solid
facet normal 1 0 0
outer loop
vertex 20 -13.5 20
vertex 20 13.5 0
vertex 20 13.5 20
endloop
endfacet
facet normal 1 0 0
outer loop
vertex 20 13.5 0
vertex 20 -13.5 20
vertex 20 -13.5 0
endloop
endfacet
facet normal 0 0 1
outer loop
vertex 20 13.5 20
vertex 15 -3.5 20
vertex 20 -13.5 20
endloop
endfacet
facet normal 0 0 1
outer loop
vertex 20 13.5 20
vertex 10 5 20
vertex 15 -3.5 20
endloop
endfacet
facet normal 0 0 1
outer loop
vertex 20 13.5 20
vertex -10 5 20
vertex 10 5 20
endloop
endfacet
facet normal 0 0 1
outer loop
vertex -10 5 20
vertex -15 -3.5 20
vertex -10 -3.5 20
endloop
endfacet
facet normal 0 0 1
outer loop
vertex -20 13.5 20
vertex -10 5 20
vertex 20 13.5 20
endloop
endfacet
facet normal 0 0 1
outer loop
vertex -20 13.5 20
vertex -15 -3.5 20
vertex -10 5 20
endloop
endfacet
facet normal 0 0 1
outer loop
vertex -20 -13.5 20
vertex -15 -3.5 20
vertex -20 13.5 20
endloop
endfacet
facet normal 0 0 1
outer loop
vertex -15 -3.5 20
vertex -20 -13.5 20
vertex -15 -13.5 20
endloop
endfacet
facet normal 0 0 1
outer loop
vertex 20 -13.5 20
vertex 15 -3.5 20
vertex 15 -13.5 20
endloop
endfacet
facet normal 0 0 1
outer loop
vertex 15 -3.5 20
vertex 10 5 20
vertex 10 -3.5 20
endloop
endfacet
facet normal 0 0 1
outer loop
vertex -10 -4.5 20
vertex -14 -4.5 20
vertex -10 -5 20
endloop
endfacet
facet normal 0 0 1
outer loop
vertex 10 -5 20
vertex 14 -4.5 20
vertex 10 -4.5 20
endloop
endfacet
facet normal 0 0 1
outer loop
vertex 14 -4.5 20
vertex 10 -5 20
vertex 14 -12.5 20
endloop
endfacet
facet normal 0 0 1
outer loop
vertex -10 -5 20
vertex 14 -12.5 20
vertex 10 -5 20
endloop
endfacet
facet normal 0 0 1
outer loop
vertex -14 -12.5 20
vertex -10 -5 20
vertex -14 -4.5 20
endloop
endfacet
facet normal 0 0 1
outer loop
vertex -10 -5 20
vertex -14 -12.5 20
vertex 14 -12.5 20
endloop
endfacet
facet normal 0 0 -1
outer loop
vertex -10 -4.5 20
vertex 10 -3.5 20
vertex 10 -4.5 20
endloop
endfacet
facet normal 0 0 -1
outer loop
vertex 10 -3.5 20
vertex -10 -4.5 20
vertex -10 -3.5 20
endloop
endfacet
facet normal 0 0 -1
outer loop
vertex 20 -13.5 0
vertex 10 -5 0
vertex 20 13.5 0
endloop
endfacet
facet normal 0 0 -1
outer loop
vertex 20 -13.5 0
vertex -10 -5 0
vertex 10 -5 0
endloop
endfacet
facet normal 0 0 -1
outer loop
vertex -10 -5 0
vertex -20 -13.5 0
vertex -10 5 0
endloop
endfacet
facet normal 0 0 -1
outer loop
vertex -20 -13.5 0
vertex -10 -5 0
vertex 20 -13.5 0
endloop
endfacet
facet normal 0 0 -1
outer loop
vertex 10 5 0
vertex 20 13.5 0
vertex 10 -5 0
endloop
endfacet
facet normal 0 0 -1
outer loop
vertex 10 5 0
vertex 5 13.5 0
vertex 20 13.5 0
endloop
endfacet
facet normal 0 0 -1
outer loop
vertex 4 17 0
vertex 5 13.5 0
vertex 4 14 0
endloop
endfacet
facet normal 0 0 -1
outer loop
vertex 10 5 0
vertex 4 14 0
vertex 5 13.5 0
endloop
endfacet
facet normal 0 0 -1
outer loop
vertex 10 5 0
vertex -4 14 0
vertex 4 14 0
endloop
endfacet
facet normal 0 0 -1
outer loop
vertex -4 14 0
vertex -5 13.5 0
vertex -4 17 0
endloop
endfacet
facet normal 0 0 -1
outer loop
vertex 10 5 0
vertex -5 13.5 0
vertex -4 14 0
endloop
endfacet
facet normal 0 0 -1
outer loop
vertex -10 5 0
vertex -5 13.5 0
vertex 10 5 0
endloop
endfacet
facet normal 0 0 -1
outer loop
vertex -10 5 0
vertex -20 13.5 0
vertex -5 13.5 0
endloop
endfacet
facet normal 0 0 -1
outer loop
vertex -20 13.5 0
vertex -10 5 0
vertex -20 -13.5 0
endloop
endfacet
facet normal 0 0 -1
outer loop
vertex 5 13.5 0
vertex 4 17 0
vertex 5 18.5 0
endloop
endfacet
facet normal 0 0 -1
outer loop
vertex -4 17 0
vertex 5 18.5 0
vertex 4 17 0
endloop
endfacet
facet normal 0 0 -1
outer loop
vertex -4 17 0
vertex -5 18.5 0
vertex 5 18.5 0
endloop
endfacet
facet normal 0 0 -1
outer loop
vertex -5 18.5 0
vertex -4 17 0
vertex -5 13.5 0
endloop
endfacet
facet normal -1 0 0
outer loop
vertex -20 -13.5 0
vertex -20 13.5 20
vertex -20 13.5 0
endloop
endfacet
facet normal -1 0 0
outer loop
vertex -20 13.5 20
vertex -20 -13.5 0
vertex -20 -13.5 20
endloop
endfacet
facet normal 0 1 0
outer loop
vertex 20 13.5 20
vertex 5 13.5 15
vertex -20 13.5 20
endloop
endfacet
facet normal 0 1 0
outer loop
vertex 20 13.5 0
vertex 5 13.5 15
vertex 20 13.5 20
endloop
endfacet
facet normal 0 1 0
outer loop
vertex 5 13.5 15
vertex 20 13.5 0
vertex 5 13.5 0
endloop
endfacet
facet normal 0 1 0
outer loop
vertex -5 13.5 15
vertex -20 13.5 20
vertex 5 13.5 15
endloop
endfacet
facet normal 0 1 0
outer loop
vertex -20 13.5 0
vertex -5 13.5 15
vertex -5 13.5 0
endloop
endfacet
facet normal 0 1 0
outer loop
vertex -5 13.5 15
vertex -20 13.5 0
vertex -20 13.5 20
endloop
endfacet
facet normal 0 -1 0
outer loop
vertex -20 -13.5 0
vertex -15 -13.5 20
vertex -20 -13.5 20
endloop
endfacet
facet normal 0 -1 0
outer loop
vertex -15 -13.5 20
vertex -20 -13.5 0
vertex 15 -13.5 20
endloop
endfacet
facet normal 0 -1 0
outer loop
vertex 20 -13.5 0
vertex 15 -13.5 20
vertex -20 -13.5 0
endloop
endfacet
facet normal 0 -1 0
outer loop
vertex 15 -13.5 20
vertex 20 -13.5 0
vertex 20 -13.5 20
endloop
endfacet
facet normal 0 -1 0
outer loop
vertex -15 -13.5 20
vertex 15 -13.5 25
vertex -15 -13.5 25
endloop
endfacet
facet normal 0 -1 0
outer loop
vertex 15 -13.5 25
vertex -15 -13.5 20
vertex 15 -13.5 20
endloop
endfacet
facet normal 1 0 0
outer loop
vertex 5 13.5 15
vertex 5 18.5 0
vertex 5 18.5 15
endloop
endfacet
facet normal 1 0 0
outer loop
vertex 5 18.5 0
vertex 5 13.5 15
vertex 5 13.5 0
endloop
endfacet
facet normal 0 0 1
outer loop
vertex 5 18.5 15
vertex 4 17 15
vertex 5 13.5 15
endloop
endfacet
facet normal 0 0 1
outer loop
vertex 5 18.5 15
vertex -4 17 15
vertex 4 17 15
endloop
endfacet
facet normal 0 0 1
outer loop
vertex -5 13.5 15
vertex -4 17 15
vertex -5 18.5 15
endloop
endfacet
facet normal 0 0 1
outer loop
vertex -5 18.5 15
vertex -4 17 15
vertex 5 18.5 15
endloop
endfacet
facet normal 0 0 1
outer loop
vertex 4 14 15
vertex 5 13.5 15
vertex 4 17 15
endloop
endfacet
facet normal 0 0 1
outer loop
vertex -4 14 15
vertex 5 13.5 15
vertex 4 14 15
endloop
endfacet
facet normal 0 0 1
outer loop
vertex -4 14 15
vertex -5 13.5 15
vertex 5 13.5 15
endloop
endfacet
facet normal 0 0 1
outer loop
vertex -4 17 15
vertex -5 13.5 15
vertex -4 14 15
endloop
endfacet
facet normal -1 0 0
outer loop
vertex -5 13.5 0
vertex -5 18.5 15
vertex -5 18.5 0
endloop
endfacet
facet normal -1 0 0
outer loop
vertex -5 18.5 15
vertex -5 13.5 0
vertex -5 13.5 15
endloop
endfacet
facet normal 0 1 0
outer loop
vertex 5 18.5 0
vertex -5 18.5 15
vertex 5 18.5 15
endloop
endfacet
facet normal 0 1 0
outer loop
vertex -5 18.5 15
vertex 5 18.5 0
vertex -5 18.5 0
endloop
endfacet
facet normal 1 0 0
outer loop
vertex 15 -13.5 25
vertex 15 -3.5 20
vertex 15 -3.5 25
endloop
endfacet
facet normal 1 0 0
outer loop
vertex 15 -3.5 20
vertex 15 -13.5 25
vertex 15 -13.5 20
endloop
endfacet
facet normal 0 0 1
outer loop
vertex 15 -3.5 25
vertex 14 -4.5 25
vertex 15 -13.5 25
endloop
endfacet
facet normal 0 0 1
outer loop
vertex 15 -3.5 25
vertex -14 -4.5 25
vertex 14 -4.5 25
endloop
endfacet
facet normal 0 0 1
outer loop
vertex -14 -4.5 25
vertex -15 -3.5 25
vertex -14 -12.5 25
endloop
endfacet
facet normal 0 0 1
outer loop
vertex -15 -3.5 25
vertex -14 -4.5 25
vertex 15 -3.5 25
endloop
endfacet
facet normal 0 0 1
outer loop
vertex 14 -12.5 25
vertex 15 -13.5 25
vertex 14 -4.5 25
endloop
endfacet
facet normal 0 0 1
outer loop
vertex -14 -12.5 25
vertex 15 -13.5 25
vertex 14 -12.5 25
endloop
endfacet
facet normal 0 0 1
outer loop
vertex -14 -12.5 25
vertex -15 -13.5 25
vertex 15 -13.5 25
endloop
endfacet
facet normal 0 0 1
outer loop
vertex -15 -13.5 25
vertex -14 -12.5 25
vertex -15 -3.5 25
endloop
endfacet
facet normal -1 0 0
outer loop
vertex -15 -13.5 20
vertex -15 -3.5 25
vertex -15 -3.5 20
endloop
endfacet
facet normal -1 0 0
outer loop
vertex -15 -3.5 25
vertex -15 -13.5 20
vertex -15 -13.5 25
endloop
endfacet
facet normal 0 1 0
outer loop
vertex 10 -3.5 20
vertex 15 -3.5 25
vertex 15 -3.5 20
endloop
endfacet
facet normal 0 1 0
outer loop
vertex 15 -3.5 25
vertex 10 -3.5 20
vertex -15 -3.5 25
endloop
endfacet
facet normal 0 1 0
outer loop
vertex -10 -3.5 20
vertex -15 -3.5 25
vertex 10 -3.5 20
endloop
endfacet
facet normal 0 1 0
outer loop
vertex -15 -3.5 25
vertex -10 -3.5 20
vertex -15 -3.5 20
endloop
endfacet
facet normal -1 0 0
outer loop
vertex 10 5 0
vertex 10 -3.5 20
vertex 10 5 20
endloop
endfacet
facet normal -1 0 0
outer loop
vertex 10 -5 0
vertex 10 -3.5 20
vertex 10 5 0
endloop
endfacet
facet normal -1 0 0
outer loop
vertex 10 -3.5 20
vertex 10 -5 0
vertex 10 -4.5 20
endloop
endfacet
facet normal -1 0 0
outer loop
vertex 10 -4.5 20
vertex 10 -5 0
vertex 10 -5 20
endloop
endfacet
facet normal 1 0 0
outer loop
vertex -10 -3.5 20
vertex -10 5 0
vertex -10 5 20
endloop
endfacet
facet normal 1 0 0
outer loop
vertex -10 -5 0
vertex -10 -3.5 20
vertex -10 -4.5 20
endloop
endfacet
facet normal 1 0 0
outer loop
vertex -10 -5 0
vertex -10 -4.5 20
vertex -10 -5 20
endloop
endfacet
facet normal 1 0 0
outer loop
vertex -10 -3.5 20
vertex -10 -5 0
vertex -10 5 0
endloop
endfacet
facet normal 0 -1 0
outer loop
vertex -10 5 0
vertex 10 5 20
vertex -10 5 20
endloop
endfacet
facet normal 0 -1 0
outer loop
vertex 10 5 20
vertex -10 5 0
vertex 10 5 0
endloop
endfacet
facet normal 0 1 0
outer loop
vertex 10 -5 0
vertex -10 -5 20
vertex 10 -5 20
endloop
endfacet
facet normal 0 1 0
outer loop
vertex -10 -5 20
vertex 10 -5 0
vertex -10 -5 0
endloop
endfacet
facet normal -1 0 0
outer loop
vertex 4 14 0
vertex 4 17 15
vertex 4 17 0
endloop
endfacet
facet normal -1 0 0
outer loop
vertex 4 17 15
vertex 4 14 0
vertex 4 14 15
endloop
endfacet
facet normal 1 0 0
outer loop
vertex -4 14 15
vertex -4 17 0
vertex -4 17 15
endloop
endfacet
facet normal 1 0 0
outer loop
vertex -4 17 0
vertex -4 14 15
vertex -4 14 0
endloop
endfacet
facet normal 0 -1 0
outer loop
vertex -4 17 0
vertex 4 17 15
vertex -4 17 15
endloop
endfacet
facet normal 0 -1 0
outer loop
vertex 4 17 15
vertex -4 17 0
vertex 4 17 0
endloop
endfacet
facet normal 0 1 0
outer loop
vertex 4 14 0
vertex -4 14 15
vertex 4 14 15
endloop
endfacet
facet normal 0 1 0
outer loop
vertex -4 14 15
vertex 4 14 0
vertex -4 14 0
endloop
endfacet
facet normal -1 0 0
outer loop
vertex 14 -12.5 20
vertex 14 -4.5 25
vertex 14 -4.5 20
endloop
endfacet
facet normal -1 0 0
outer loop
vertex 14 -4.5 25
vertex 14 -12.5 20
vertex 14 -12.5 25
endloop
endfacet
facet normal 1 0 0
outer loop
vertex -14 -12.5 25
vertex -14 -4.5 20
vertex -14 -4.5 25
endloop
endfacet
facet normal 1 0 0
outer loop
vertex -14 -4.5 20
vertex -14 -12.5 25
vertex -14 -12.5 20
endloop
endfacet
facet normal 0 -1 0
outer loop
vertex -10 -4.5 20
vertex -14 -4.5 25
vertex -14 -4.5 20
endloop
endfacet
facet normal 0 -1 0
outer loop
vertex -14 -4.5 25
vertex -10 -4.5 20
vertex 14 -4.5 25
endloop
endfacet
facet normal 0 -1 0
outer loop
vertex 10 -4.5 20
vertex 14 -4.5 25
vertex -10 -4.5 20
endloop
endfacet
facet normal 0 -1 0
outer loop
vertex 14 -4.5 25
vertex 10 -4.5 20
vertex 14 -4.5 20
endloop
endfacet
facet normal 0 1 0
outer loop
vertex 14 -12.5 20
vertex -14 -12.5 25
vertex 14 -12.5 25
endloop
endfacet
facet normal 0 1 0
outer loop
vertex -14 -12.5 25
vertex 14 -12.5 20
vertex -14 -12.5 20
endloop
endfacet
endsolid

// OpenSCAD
module iec_power_inlet() {
    difference() {
        // Main body
        union() {
            // Main rectangular body
            translate([-20, -13.5, 0])
                cube([40, 27, 20]);
            
            // Fuse holder
            translate([-5, 13.5, 0])
                cube([10, 5, 15]);
            
            // Switch
            translate([-15, -13.5, 20])
                cube([30, 10, 5]);
        }
        
        // Cutout for the inlet
        translate([-10, -5, 0])
            cube([20, 10, 20]);
        
        // Cutout for the fuse
        translate([-4, 14, 0])
            cube([8, 3, 15]);
        
        // Cutout for the switch
        translate([-14, -12.5, 20])
            cube([28, 8, 5]);
    }
}

iec_power_inlet();
